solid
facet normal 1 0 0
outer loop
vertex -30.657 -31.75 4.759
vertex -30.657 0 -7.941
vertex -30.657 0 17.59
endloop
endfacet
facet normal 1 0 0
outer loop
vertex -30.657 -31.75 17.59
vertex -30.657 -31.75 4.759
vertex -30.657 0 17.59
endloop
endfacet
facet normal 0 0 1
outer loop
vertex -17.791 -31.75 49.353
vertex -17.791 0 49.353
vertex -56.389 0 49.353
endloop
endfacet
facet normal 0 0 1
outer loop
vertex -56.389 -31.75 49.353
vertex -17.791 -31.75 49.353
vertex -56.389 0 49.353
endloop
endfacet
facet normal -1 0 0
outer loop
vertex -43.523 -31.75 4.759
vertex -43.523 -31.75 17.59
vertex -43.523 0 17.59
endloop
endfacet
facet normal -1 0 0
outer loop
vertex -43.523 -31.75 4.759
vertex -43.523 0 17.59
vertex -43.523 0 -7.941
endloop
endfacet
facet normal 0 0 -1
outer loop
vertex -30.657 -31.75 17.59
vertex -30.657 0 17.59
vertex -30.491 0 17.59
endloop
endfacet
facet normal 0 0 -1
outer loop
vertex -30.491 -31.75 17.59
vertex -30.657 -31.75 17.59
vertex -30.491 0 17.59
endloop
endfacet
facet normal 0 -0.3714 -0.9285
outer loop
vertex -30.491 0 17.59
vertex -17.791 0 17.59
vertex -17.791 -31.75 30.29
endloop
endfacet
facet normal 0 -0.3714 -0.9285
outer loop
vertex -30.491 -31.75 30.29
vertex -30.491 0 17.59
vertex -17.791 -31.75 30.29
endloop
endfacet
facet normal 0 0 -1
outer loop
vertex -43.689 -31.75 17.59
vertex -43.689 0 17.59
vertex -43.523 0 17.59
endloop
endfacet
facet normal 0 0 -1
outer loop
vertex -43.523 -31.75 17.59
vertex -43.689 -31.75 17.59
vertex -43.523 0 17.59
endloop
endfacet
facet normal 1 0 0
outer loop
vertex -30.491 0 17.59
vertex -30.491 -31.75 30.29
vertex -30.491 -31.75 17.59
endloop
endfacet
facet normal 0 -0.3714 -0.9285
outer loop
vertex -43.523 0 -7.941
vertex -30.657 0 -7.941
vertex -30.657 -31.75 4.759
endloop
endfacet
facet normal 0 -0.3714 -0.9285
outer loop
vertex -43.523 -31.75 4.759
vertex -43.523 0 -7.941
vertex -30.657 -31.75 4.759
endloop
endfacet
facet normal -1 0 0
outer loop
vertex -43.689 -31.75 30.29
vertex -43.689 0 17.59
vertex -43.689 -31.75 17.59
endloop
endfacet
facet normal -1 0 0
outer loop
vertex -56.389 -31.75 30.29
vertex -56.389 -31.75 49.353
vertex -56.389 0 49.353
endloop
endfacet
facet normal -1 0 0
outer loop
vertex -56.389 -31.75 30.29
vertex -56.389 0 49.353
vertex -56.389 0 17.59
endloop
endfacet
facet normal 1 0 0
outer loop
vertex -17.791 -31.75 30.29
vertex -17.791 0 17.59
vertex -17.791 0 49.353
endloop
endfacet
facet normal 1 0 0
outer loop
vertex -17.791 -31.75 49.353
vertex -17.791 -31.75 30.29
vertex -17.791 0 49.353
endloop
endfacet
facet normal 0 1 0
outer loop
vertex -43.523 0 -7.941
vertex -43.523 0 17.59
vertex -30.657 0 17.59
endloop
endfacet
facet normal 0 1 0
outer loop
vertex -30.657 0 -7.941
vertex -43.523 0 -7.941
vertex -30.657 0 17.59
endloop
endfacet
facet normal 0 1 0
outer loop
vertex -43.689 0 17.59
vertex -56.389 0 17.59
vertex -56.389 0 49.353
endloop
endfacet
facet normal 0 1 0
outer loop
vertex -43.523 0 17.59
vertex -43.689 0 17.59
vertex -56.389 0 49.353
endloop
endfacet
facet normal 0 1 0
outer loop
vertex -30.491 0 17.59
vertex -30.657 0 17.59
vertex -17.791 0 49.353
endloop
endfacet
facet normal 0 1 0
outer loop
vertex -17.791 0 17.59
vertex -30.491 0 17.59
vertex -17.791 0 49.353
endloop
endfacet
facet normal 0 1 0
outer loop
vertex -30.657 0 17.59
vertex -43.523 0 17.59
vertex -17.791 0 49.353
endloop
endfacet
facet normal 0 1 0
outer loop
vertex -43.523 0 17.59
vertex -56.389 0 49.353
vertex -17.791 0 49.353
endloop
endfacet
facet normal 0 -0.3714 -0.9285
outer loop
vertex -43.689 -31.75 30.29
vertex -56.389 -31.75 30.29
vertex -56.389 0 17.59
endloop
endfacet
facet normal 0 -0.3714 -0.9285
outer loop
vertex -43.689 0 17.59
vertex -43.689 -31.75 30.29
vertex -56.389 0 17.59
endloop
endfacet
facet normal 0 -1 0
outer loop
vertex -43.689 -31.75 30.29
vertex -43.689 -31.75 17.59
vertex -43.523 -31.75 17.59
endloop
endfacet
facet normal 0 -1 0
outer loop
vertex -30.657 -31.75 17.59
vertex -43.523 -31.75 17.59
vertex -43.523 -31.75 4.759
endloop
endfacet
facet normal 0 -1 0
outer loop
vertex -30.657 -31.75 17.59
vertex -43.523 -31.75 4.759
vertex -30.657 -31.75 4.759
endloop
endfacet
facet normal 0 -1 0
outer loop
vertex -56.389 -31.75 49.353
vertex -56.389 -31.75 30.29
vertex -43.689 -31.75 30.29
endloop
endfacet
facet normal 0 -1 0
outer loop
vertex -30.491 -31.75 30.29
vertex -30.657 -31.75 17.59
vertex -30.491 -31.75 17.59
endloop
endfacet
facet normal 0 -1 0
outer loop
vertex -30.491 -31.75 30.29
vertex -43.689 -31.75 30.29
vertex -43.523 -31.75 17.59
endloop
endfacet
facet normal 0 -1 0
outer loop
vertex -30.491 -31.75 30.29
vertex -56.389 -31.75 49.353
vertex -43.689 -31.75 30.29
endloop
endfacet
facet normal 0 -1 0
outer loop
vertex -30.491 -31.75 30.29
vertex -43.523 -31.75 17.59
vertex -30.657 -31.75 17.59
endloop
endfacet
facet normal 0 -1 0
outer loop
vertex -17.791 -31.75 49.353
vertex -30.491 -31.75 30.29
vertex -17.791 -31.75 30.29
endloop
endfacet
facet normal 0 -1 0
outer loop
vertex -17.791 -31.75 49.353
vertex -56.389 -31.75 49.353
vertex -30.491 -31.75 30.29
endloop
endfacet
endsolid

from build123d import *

# Parameters (mm, degrees)
F1_DEPTH = 31.75
F3_DEPTH = 25.732862
F5_DEPTH = 12.7
F7_DEPTH = 12.7


with BuildPart() as f1:
    # F0 (on Front) → F1 (new body)
    with BuildSketch(Plane.XZ):
        Polygon((-17.791169, 49.352903), (-56.388959, 49.352903), (-56.388959, 17.590139), (-43.523028, 17.590139), (-43.523028, -7.940691), (-30.657098, -7.940691), (-30.657098, 17.590139), (-17.791169, 17.590139), align=None)
    extrude(amount=F1_DEPTH)

    # F2 (on face) → F3 (cut, through all)
    with BuildSketch(Plane.YZ.offset(-30.657098)):
        Polygon((0, -7.940691), (-31.75, 4.759309), (-31.75, -7.940691), align=None)
    extrude(amount=-F3_DEPTH, mode=Mode.SUBTRACT)

    # F4 (on face) → F5 (cut)
    with BuildSketch(Plane(origin=(-56.388959, 0, 0), x_dir=(0, -1, 0), z_dir=(-1, 0, 0))):
        Polygon((31.75, 17.590139), (31.75, 30.290139), (0, 17.590139), align=None)
    extrude(amount=-F5_DEPTH, mode=Mode.SUBTRACT)

    # F6 (on face) → F7 (cut)
    with BuildSketch(Plane.YZ.offset(-17.791169)):
        Polygon((0, 17.590139), (-31.75, 30.290139), (-31.75, 17.590139), align=None)
    extrude(amount=-F7_DEPTH, mode=Mode.SUBTRACT)


solid = f1.part
